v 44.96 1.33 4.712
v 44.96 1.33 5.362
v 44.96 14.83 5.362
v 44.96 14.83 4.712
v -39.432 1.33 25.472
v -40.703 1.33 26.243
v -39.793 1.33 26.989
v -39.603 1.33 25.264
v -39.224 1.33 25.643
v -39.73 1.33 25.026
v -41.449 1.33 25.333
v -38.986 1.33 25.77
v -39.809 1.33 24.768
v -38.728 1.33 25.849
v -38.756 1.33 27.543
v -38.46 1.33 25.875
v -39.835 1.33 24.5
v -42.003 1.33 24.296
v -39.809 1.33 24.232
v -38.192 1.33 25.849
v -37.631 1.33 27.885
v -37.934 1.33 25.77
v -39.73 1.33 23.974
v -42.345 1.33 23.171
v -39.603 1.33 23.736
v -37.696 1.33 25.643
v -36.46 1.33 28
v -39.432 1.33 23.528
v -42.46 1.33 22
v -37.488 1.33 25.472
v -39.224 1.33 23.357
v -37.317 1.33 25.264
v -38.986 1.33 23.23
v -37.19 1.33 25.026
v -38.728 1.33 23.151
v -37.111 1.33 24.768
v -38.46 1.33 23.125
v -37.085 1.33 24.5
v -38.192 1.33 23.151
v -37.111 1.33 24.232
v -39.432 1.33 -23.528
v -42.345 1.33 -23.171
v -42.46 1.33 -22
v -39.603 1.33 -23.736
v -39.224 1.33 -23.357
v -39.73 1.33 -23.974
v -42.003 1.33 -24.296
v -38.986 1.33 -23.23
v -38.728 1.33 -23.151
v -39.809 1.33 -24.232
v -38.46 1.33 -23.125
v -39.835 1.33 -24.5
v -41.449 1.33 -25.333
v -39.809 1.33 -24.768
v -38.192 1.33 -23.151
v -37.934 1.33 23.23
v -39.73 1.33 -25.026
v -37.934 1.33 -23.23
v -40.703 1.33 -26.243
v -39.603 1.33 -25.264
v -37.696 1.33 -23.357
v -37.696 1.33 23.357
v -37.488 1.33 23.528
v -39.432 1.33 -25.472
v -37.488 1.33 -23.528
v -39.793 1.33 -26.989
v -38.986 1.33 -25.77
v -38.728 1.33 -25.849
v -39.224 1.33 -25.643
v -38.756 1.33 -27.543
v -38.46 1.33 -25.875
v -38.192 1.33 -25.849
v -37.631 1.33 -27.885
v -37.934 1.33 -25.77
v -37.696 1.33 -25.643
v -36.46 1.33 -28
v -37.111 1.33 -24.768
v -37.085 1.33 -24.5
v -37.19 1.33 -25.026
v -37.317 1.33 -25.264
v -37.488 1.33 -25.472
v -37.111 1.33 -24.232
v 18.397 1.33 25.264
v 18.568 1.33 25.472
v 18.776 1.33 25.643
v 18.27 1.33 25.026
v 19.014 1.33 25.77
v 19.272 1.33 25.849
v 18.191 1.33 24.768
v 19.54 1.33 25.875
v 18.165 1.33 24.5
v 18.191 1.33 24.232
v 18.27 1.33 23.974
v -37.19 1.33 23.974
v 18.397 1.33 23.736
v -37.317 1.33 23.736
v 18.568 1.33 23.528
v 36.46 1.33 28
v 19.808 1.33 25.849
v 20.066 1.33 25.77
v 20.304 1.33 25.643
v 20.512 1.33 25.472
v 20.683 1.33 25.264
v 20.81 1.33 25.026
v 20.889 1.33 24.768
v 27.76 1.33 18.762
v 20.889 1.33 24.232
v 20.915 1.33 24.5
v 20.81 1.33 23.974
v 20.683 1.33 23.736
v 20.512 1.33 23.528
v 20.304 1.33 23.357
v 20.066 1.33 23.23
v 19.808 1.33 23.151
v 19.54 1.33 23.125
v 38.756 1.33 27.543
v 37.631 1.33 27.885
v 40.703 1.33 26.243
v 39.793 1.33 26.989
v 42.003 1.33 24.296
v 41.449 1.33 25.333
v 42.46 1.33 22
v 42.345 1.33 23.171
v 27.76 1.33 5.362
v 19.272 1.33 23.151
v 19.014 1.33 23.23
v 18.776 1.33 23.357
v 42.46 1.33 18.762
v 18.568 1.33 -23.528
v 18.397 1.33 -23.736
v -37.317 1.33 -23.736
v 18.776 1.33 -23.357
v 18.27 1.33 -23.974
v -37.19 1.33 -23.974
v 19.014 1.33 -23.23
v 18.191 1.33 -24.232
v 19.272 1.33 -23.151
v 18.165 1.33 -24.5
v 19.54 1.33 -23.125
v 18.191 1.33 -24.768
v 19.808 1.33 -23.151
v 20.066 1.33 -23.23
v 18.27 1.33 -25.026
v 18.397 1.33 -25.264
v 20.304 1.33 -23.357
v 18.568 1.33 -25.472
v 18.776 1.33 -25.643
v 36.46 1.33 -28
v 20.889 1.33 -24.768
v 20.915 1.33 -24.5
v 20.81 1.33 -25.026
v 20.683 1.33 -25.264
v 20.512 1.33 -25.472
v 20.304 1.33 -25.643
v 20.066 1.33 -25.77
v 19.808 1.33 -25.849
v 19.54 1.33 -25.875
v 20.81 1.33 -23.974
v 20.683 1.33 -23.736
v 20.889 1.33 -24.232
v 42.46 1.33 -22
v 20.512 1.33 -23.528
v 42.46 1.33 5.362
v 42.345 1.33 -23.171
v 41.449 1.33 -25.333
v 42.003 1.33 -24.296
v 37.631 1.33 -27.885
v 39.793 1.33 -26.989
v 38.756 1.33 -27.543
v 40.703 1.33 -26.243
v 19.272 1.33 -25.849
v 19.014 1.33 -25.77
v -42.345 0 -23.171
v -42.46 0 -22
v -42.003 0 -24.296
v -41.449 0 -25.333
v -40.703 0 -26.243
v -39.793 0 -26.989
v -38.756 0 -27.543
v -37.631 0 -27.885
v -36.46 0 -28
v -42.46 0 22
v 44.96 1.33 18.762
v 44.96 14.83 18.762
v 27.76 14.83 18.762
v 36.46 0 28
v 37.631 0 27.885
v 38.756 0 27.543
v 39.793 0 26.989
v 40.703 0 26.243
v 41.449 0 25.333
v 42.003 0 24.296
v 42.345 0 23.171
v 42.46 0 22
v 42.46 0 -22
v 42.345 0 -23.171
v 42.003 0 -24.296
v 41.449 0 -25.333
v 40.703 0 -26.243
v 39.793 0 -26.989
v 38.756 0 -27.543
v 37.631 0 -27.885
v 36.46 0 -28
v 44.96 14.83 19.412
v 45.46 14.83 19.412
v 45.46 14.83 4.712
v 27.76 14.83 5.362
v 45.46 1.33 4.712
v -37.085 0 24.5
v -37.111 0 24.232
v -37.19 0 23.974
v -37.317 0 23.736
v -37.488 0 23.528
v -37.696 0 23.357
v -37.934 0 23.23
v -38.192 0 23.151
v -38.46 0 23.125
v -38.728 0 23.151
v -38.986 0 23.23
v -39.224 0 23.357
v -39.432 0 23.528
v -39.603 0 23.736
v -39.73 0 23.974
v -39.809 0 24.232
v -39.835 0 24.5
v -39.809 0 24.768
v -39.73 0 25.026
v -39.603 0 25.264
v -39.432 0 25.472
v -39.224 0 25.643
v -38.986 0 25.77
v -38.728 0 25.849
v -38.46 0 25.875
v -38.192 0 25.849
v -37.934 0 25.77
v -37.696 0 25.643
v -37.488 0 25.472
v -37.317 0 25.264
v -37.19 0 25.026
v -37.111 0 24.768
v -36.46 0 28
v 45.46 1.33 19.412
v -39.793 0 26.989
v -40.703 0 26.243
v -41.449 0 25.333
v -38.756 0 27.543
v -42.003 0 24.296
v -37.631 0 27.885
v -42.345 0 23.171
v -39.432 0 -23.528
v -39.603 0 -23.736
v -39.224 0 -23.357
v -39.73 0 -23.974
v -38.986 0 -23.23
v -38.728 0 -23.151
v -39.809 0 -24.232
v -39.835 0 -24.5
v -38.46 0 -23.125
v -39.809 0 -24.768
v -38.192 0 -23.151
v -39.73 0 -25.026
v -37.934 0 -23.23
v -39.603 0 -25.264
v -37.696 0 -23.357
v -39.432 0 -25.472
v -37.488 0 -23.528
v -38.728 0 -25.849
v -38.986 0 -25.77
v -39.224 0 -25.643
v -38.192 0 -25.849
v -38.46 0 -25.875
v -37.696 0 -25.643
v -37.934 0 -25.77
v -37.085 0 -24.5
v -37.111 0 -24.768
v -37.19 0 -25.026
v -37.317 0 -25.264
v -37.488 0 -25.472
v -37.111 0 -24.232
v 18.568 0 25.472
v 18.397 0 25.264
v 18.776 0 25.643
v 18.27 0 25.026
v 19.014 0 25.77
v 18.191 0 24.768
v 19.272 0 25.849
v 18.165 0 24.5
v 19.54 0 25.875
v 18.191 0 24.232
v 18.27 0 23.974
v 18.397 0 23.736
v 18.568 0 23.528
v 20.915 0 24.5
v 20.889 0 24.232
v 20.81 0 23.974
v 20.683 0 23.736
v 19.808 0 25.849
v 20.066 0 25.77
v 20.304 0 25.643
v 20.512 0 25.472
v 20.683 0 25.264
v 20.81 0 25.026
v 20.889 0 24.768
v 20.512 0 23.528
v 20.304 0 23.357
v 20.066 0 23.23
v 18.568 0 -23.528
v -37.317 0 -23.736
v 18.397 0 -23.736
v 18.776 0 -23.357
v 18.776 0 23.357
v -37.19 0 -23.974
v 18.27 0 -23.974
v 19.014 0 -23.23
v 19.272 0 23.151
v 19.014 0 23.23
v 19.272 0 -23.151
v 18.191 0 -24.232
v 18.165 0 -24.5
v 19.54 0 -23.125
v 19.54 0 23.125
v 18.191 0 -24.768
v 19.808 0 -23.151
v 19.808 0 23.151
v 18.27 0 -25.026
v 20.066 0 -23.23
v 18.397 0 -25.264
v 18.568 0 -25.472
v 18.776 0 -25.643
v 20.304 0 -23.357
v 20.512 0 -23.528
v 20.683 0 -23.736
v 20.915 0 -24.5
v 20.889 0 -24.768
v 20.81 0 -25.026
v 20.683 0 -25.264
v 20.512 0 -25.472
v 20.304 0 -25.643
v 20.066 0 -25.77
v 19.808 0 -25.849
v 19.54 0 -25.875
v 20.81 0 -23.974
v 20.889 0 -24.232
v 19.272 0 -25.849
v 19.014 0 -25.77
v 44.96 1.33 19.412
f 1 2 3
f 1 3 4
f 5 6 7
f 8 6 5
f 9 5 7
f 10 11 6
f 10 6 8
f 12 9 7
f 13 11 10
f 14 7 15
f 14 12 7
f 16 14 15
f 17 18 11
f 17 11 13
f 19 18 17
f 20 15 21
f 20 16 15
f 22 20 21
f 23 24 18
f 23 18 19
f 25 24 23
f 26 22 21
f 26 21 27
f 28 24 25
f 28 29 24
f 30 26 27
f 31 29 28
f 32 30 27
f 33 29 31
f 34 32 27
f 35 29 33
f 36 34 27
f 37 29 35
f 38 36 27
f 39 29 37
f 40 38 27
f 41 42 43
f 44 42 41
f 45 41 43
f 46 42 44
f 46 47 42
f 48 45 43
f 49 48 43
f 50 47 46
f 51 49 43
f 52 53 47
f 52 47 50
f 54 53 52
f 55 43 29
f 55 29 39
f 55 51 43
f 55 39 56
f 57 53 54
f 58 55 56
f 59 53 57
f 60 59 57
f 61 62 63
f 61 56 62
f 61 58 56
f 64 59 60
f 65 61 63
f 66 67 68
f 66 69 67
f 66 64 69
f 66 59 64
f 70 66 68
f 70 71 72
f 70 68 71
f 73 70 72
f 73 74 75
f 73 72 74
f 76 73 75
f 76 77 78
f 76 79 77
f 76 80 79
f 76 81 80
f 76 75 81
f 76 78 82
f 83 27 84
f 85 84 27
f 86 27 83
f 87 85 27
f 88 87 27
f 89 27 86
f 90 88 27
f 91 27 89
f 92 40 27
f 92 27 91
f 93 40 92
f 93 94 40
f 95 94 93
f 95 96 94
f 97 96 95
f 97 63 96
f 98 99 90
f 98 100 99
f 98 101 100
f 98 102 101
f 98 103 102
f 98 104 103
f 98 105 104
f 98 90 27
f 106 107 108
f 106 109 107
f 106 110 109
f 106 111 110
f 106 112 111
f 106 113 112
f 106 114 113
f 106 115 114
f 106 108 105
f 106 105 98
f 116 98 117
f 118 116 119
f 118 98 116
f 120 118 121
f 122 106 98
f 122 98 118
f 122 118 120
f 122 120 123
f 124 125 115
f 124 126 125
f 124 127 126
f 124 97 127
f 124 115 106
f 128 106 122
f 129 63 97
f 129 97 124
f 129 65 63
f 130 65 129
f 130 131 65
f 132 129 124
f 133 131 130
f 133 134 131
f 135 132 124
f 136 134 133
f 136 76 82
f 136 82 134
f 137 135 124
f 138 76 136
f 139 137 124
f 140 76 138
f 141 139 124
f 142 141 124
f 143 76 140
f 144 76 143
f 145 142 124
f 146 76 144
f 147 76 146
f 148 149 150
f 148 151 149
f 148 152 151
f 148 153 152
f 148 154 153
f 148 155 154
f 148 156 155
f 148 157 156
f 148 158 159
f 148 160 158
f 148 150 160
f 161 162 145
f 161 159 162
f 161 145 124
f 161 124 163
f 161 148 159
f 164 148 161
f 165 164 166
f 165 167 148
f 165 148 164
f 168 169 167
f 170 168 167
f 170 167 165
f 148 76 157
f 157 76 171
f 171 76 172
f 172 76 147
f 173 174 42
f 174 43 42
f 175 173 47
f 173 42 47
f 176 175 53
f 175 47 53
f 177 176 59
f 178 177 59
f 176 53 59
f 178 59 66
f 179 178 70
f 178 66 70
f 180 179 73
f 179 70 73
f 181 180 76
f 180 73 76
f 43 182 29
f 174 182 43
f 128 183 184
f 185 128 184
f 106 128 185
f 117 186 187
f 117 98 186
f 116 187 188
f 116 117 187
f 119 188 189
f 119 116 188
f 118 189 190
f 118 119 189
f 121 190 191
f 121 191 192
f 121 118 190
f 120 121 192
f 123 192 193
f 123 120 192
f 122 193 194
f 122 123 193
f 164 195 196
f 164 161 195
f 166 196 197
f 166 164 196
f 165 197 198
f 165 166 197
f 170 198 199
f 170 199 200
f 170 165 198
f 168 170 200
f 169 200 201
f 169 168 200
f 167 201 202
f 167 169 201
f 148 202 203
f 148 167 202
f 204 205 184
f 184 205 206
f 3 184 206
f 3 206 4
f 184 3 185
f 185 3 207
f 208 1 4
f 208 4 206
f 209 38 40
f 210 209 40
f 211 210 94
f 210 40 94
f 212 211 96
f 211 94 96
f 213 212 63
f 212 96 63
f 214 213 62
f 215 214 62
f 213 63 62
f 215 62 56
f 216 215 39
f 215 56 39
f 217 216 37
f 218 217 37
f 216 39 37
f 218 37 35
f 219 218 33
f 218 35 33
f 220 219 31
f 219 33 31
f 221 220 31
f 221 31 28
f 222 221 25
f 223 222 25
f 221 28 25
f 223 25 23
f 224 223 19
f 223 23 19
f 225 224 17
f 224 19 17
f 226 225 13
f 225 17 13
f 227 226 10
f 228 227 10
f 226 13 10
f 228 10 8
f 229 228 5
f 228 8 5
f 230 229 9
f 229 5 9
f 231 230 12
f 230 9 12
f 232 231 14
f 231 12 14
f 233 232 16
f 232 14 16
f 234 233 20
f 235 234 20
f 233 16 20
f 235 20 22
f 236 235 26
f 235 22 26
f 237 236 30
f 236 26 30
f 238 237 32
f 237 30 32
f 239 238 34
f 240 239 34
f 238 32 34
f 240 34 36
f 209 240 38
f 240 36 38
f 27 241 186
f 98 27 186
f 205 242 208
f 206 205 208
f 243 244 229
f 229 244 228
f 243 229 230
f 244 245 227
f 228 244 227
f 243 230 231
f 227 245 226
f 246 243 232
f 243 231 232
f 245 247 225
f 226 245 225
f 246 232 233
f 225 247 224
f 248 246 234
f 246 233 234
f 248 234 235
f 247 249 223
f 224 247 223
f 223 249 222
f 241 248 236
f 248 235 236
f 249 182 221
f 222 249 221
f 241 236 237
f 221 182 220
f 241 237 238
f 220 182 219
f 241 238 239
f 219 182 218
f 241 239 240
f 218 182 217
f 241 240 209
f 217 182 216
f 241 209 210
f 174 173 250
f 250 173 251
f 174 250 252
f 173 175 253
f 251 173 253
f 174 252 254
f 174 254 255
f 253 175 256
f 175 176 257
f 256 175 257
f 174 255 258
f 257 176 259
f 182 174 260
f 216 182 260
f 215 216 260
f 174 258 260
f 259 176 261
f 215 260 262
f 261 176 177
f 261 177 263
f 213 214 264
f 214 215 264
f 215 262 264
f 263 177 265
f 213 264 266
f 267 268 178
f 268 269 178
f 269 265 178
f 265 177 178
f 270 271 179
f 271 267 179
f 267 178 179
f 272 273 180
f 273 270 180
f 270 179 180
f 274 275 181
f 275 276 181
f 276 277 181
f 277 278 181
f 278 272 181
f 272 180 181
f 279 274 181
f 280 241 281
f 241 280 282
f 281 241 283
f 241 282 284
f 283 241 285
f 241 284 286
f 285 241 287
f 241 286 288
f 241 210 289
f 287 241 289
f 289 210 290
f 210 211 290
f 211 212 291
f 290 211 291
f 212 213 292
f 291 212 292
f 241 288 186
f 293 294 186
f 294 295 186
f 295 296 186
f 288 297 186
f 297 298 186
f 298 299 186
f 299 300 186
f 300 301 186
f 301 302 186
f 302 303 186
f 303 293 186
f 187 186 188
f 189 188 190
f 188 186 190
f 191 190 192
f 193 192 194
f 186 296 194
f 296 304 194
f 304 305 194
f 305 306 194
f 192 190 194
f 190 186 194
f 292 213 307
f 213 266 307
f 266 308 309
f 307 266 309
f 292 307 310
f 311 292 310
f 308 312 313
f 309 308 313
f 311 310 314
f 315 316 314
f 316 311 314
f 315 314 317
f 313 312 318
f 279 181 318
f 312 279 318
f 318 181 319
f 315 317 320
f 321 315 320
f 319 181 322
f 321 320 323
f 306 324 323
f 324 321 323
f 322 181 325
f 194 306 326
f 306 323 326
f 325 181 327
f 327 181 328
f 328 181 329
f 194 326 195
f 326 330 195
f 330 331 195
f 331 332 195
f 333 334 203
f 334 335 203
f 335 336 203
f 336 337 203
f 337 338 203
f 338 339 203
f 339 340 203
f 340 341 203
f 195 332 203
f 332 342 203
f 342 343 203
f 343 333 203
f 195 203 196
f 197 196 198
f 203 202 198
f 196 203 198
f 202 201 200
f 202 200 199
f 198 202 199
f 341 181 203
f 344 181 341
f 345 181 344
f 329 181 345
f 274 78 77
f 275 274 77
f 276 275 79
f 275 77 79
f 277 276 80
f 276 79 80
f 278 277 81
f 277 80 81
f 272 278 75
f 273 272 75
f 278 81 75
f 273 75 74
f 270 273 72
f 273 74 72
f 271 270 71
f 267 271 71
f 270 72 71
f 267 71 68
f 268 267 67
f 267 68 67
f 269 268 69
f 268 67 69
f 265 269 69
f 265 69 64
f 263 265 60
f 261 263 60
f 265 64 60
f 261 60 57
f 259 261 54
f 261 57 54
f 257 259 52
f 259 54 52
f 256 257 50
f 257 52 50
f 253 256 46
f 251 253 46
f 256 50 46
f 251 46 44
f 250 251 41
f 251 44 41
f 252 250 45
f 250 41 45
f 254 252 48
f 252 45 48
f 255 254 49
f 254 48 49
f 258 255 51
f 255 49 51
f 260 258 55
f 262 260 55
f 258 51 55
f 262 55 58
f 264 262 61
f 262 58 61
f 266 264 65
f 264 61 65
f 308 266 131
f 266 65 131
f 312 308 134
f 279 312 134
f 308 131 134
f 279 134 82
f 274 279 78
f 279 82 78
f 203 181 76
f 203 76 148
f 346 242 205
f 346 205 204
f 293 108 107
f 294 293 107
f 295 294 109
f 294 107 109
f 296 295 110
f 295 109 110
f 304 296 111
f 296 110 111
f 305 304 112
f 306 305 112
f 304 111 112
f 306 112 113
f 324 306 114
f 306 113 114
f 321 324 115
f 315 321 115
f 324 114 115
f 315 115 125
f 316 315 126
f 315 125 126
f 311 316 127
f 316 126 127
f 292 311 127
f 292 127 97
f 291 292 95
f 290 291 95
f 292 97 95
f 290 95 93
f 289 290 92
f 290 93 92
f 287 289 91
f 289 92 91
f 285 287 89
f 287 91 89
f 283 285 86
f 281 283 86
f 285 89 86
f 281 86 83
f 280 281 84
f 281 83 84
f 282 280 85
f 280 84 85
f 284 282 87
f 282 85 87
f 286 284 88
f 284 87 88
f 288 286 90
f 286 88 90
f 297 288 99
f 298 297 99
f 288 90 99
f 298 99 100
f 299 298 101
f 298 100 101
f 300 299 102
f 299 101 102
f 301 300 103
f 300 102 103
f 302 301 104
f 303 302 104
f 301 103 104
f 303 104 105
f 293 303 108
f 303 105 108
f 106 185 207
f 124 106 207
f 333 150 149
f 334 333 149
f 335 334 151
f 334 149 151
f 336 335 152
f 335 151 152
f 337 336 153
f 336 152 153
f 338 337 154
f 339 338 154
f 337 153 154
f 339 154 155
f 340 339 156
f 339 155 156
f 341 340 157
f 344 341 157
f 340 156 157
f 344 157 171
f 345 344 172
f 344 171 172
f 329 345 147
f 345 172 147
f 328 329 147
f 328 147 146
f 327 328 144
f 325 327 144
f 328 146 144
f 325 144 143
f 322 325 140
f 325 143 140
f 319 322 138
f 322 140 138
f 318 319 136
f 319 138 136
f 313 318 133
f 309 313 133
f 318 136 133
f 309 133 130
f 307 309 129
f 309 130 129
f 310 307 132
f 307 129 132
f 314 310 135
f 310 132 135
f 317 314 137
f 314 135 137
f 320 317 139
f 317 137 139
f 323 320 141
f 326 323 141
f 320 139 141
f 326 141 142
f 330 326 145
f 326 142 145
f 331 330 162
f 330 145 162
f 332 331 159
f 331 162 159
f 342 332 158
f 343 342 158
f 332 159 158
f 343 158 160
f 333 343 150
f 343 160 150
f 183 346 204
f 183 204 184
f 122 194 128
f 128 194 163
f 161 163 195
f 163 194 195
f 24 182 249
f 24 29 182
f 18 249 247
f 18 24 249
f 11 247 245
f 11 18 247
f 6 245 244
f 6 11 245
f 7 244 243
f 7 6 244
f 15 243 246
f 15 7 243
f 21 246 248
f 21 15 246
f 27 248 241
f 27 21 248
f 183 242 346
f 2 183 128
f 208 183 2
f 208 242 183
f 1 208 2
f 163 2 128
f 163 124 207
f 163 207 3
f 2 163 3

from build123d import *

# Parameters (mm, degrees)
CROQUIS1_W              = 84.92
CROQUIS1_H              = 56
SALIENTE_EXTRUIR1_DEPTH = 1.33
REDONDEO1_R             = 6
CROQUIS2_R              = 1.375
CORTAR_EXTRUIR1_DEPTH   = 1.33
SALIENTE_EXTRUIR2_DEPTH = 13.5


with BuildPart() as part:
    # Croquis1 → Saliente-Extruir1 (new body)
    with BuildSketch(Plane(origin=(0, 0, 0), x_dir=(1, 0, 0), z_dir=(0, 1, 0))):
        Rectangle(CROQUIS1_W, CROQUIS1_H)
    extrude(amount=SALIENTE_EXTRUIR1_DEPTH)

    # Redondeo1
    redondeo1_edges = [part.edges().sort_by_distance(p)[0] for p in [
        (42.46, 0.665, 28),
        (-42.46, 0.665, 28),
        (-42.46, 0.665, -28),
        (42.46, 0.665, -28),
    ]]
    fillet(redondeo1_edges, radius=REDONDEO1_R)

    # Croquis2 → Cortar-Extruir1 (cut)
    with BuildSketch(Plane(origin=(0, 1.33, 0), x_dir=(1, 0, 0), z_dir=(0, 1, 0))):
        with Locations((-38.46, 24.5)):
            Circle(CROQUIS2_R)
        with Locations((-38.46, -24.5)):
            Circle(CROQUIS2_R)
        with Locations((19.54, -24.5)):
            Circle(CROQUIS2_R)
        with Locations((19.54, 24.5)):
            Circle(CROQUIS2_R)
    extrude(amount=-CORTAR_EXTRUIR1_DEPTH, mode=Mode.SUBTRACT)

    # Croquis3 → Saliente-Extruir2 (add)
    with BuildSketch(Plane(origin=(0, 1.33, 0), x_dir=(1, 0, 0), z_dir=(0, 1, 0))):
        Polygon((45.46, -18.762058392), (45.46, -19.412058392), (44.96, -19.412058392), (44.96, -18.762058392), (27.76, -18.762058392), (27.76, -5.362058392), (44.96, -5.362058392), (44.96, -4.712058392), (45.46, -4.712058392), (45.46, -5.362058392), align=None)
    extrude(amount=SALIENTE_EXTRUIR2_DEPTH)


solid = part.part
